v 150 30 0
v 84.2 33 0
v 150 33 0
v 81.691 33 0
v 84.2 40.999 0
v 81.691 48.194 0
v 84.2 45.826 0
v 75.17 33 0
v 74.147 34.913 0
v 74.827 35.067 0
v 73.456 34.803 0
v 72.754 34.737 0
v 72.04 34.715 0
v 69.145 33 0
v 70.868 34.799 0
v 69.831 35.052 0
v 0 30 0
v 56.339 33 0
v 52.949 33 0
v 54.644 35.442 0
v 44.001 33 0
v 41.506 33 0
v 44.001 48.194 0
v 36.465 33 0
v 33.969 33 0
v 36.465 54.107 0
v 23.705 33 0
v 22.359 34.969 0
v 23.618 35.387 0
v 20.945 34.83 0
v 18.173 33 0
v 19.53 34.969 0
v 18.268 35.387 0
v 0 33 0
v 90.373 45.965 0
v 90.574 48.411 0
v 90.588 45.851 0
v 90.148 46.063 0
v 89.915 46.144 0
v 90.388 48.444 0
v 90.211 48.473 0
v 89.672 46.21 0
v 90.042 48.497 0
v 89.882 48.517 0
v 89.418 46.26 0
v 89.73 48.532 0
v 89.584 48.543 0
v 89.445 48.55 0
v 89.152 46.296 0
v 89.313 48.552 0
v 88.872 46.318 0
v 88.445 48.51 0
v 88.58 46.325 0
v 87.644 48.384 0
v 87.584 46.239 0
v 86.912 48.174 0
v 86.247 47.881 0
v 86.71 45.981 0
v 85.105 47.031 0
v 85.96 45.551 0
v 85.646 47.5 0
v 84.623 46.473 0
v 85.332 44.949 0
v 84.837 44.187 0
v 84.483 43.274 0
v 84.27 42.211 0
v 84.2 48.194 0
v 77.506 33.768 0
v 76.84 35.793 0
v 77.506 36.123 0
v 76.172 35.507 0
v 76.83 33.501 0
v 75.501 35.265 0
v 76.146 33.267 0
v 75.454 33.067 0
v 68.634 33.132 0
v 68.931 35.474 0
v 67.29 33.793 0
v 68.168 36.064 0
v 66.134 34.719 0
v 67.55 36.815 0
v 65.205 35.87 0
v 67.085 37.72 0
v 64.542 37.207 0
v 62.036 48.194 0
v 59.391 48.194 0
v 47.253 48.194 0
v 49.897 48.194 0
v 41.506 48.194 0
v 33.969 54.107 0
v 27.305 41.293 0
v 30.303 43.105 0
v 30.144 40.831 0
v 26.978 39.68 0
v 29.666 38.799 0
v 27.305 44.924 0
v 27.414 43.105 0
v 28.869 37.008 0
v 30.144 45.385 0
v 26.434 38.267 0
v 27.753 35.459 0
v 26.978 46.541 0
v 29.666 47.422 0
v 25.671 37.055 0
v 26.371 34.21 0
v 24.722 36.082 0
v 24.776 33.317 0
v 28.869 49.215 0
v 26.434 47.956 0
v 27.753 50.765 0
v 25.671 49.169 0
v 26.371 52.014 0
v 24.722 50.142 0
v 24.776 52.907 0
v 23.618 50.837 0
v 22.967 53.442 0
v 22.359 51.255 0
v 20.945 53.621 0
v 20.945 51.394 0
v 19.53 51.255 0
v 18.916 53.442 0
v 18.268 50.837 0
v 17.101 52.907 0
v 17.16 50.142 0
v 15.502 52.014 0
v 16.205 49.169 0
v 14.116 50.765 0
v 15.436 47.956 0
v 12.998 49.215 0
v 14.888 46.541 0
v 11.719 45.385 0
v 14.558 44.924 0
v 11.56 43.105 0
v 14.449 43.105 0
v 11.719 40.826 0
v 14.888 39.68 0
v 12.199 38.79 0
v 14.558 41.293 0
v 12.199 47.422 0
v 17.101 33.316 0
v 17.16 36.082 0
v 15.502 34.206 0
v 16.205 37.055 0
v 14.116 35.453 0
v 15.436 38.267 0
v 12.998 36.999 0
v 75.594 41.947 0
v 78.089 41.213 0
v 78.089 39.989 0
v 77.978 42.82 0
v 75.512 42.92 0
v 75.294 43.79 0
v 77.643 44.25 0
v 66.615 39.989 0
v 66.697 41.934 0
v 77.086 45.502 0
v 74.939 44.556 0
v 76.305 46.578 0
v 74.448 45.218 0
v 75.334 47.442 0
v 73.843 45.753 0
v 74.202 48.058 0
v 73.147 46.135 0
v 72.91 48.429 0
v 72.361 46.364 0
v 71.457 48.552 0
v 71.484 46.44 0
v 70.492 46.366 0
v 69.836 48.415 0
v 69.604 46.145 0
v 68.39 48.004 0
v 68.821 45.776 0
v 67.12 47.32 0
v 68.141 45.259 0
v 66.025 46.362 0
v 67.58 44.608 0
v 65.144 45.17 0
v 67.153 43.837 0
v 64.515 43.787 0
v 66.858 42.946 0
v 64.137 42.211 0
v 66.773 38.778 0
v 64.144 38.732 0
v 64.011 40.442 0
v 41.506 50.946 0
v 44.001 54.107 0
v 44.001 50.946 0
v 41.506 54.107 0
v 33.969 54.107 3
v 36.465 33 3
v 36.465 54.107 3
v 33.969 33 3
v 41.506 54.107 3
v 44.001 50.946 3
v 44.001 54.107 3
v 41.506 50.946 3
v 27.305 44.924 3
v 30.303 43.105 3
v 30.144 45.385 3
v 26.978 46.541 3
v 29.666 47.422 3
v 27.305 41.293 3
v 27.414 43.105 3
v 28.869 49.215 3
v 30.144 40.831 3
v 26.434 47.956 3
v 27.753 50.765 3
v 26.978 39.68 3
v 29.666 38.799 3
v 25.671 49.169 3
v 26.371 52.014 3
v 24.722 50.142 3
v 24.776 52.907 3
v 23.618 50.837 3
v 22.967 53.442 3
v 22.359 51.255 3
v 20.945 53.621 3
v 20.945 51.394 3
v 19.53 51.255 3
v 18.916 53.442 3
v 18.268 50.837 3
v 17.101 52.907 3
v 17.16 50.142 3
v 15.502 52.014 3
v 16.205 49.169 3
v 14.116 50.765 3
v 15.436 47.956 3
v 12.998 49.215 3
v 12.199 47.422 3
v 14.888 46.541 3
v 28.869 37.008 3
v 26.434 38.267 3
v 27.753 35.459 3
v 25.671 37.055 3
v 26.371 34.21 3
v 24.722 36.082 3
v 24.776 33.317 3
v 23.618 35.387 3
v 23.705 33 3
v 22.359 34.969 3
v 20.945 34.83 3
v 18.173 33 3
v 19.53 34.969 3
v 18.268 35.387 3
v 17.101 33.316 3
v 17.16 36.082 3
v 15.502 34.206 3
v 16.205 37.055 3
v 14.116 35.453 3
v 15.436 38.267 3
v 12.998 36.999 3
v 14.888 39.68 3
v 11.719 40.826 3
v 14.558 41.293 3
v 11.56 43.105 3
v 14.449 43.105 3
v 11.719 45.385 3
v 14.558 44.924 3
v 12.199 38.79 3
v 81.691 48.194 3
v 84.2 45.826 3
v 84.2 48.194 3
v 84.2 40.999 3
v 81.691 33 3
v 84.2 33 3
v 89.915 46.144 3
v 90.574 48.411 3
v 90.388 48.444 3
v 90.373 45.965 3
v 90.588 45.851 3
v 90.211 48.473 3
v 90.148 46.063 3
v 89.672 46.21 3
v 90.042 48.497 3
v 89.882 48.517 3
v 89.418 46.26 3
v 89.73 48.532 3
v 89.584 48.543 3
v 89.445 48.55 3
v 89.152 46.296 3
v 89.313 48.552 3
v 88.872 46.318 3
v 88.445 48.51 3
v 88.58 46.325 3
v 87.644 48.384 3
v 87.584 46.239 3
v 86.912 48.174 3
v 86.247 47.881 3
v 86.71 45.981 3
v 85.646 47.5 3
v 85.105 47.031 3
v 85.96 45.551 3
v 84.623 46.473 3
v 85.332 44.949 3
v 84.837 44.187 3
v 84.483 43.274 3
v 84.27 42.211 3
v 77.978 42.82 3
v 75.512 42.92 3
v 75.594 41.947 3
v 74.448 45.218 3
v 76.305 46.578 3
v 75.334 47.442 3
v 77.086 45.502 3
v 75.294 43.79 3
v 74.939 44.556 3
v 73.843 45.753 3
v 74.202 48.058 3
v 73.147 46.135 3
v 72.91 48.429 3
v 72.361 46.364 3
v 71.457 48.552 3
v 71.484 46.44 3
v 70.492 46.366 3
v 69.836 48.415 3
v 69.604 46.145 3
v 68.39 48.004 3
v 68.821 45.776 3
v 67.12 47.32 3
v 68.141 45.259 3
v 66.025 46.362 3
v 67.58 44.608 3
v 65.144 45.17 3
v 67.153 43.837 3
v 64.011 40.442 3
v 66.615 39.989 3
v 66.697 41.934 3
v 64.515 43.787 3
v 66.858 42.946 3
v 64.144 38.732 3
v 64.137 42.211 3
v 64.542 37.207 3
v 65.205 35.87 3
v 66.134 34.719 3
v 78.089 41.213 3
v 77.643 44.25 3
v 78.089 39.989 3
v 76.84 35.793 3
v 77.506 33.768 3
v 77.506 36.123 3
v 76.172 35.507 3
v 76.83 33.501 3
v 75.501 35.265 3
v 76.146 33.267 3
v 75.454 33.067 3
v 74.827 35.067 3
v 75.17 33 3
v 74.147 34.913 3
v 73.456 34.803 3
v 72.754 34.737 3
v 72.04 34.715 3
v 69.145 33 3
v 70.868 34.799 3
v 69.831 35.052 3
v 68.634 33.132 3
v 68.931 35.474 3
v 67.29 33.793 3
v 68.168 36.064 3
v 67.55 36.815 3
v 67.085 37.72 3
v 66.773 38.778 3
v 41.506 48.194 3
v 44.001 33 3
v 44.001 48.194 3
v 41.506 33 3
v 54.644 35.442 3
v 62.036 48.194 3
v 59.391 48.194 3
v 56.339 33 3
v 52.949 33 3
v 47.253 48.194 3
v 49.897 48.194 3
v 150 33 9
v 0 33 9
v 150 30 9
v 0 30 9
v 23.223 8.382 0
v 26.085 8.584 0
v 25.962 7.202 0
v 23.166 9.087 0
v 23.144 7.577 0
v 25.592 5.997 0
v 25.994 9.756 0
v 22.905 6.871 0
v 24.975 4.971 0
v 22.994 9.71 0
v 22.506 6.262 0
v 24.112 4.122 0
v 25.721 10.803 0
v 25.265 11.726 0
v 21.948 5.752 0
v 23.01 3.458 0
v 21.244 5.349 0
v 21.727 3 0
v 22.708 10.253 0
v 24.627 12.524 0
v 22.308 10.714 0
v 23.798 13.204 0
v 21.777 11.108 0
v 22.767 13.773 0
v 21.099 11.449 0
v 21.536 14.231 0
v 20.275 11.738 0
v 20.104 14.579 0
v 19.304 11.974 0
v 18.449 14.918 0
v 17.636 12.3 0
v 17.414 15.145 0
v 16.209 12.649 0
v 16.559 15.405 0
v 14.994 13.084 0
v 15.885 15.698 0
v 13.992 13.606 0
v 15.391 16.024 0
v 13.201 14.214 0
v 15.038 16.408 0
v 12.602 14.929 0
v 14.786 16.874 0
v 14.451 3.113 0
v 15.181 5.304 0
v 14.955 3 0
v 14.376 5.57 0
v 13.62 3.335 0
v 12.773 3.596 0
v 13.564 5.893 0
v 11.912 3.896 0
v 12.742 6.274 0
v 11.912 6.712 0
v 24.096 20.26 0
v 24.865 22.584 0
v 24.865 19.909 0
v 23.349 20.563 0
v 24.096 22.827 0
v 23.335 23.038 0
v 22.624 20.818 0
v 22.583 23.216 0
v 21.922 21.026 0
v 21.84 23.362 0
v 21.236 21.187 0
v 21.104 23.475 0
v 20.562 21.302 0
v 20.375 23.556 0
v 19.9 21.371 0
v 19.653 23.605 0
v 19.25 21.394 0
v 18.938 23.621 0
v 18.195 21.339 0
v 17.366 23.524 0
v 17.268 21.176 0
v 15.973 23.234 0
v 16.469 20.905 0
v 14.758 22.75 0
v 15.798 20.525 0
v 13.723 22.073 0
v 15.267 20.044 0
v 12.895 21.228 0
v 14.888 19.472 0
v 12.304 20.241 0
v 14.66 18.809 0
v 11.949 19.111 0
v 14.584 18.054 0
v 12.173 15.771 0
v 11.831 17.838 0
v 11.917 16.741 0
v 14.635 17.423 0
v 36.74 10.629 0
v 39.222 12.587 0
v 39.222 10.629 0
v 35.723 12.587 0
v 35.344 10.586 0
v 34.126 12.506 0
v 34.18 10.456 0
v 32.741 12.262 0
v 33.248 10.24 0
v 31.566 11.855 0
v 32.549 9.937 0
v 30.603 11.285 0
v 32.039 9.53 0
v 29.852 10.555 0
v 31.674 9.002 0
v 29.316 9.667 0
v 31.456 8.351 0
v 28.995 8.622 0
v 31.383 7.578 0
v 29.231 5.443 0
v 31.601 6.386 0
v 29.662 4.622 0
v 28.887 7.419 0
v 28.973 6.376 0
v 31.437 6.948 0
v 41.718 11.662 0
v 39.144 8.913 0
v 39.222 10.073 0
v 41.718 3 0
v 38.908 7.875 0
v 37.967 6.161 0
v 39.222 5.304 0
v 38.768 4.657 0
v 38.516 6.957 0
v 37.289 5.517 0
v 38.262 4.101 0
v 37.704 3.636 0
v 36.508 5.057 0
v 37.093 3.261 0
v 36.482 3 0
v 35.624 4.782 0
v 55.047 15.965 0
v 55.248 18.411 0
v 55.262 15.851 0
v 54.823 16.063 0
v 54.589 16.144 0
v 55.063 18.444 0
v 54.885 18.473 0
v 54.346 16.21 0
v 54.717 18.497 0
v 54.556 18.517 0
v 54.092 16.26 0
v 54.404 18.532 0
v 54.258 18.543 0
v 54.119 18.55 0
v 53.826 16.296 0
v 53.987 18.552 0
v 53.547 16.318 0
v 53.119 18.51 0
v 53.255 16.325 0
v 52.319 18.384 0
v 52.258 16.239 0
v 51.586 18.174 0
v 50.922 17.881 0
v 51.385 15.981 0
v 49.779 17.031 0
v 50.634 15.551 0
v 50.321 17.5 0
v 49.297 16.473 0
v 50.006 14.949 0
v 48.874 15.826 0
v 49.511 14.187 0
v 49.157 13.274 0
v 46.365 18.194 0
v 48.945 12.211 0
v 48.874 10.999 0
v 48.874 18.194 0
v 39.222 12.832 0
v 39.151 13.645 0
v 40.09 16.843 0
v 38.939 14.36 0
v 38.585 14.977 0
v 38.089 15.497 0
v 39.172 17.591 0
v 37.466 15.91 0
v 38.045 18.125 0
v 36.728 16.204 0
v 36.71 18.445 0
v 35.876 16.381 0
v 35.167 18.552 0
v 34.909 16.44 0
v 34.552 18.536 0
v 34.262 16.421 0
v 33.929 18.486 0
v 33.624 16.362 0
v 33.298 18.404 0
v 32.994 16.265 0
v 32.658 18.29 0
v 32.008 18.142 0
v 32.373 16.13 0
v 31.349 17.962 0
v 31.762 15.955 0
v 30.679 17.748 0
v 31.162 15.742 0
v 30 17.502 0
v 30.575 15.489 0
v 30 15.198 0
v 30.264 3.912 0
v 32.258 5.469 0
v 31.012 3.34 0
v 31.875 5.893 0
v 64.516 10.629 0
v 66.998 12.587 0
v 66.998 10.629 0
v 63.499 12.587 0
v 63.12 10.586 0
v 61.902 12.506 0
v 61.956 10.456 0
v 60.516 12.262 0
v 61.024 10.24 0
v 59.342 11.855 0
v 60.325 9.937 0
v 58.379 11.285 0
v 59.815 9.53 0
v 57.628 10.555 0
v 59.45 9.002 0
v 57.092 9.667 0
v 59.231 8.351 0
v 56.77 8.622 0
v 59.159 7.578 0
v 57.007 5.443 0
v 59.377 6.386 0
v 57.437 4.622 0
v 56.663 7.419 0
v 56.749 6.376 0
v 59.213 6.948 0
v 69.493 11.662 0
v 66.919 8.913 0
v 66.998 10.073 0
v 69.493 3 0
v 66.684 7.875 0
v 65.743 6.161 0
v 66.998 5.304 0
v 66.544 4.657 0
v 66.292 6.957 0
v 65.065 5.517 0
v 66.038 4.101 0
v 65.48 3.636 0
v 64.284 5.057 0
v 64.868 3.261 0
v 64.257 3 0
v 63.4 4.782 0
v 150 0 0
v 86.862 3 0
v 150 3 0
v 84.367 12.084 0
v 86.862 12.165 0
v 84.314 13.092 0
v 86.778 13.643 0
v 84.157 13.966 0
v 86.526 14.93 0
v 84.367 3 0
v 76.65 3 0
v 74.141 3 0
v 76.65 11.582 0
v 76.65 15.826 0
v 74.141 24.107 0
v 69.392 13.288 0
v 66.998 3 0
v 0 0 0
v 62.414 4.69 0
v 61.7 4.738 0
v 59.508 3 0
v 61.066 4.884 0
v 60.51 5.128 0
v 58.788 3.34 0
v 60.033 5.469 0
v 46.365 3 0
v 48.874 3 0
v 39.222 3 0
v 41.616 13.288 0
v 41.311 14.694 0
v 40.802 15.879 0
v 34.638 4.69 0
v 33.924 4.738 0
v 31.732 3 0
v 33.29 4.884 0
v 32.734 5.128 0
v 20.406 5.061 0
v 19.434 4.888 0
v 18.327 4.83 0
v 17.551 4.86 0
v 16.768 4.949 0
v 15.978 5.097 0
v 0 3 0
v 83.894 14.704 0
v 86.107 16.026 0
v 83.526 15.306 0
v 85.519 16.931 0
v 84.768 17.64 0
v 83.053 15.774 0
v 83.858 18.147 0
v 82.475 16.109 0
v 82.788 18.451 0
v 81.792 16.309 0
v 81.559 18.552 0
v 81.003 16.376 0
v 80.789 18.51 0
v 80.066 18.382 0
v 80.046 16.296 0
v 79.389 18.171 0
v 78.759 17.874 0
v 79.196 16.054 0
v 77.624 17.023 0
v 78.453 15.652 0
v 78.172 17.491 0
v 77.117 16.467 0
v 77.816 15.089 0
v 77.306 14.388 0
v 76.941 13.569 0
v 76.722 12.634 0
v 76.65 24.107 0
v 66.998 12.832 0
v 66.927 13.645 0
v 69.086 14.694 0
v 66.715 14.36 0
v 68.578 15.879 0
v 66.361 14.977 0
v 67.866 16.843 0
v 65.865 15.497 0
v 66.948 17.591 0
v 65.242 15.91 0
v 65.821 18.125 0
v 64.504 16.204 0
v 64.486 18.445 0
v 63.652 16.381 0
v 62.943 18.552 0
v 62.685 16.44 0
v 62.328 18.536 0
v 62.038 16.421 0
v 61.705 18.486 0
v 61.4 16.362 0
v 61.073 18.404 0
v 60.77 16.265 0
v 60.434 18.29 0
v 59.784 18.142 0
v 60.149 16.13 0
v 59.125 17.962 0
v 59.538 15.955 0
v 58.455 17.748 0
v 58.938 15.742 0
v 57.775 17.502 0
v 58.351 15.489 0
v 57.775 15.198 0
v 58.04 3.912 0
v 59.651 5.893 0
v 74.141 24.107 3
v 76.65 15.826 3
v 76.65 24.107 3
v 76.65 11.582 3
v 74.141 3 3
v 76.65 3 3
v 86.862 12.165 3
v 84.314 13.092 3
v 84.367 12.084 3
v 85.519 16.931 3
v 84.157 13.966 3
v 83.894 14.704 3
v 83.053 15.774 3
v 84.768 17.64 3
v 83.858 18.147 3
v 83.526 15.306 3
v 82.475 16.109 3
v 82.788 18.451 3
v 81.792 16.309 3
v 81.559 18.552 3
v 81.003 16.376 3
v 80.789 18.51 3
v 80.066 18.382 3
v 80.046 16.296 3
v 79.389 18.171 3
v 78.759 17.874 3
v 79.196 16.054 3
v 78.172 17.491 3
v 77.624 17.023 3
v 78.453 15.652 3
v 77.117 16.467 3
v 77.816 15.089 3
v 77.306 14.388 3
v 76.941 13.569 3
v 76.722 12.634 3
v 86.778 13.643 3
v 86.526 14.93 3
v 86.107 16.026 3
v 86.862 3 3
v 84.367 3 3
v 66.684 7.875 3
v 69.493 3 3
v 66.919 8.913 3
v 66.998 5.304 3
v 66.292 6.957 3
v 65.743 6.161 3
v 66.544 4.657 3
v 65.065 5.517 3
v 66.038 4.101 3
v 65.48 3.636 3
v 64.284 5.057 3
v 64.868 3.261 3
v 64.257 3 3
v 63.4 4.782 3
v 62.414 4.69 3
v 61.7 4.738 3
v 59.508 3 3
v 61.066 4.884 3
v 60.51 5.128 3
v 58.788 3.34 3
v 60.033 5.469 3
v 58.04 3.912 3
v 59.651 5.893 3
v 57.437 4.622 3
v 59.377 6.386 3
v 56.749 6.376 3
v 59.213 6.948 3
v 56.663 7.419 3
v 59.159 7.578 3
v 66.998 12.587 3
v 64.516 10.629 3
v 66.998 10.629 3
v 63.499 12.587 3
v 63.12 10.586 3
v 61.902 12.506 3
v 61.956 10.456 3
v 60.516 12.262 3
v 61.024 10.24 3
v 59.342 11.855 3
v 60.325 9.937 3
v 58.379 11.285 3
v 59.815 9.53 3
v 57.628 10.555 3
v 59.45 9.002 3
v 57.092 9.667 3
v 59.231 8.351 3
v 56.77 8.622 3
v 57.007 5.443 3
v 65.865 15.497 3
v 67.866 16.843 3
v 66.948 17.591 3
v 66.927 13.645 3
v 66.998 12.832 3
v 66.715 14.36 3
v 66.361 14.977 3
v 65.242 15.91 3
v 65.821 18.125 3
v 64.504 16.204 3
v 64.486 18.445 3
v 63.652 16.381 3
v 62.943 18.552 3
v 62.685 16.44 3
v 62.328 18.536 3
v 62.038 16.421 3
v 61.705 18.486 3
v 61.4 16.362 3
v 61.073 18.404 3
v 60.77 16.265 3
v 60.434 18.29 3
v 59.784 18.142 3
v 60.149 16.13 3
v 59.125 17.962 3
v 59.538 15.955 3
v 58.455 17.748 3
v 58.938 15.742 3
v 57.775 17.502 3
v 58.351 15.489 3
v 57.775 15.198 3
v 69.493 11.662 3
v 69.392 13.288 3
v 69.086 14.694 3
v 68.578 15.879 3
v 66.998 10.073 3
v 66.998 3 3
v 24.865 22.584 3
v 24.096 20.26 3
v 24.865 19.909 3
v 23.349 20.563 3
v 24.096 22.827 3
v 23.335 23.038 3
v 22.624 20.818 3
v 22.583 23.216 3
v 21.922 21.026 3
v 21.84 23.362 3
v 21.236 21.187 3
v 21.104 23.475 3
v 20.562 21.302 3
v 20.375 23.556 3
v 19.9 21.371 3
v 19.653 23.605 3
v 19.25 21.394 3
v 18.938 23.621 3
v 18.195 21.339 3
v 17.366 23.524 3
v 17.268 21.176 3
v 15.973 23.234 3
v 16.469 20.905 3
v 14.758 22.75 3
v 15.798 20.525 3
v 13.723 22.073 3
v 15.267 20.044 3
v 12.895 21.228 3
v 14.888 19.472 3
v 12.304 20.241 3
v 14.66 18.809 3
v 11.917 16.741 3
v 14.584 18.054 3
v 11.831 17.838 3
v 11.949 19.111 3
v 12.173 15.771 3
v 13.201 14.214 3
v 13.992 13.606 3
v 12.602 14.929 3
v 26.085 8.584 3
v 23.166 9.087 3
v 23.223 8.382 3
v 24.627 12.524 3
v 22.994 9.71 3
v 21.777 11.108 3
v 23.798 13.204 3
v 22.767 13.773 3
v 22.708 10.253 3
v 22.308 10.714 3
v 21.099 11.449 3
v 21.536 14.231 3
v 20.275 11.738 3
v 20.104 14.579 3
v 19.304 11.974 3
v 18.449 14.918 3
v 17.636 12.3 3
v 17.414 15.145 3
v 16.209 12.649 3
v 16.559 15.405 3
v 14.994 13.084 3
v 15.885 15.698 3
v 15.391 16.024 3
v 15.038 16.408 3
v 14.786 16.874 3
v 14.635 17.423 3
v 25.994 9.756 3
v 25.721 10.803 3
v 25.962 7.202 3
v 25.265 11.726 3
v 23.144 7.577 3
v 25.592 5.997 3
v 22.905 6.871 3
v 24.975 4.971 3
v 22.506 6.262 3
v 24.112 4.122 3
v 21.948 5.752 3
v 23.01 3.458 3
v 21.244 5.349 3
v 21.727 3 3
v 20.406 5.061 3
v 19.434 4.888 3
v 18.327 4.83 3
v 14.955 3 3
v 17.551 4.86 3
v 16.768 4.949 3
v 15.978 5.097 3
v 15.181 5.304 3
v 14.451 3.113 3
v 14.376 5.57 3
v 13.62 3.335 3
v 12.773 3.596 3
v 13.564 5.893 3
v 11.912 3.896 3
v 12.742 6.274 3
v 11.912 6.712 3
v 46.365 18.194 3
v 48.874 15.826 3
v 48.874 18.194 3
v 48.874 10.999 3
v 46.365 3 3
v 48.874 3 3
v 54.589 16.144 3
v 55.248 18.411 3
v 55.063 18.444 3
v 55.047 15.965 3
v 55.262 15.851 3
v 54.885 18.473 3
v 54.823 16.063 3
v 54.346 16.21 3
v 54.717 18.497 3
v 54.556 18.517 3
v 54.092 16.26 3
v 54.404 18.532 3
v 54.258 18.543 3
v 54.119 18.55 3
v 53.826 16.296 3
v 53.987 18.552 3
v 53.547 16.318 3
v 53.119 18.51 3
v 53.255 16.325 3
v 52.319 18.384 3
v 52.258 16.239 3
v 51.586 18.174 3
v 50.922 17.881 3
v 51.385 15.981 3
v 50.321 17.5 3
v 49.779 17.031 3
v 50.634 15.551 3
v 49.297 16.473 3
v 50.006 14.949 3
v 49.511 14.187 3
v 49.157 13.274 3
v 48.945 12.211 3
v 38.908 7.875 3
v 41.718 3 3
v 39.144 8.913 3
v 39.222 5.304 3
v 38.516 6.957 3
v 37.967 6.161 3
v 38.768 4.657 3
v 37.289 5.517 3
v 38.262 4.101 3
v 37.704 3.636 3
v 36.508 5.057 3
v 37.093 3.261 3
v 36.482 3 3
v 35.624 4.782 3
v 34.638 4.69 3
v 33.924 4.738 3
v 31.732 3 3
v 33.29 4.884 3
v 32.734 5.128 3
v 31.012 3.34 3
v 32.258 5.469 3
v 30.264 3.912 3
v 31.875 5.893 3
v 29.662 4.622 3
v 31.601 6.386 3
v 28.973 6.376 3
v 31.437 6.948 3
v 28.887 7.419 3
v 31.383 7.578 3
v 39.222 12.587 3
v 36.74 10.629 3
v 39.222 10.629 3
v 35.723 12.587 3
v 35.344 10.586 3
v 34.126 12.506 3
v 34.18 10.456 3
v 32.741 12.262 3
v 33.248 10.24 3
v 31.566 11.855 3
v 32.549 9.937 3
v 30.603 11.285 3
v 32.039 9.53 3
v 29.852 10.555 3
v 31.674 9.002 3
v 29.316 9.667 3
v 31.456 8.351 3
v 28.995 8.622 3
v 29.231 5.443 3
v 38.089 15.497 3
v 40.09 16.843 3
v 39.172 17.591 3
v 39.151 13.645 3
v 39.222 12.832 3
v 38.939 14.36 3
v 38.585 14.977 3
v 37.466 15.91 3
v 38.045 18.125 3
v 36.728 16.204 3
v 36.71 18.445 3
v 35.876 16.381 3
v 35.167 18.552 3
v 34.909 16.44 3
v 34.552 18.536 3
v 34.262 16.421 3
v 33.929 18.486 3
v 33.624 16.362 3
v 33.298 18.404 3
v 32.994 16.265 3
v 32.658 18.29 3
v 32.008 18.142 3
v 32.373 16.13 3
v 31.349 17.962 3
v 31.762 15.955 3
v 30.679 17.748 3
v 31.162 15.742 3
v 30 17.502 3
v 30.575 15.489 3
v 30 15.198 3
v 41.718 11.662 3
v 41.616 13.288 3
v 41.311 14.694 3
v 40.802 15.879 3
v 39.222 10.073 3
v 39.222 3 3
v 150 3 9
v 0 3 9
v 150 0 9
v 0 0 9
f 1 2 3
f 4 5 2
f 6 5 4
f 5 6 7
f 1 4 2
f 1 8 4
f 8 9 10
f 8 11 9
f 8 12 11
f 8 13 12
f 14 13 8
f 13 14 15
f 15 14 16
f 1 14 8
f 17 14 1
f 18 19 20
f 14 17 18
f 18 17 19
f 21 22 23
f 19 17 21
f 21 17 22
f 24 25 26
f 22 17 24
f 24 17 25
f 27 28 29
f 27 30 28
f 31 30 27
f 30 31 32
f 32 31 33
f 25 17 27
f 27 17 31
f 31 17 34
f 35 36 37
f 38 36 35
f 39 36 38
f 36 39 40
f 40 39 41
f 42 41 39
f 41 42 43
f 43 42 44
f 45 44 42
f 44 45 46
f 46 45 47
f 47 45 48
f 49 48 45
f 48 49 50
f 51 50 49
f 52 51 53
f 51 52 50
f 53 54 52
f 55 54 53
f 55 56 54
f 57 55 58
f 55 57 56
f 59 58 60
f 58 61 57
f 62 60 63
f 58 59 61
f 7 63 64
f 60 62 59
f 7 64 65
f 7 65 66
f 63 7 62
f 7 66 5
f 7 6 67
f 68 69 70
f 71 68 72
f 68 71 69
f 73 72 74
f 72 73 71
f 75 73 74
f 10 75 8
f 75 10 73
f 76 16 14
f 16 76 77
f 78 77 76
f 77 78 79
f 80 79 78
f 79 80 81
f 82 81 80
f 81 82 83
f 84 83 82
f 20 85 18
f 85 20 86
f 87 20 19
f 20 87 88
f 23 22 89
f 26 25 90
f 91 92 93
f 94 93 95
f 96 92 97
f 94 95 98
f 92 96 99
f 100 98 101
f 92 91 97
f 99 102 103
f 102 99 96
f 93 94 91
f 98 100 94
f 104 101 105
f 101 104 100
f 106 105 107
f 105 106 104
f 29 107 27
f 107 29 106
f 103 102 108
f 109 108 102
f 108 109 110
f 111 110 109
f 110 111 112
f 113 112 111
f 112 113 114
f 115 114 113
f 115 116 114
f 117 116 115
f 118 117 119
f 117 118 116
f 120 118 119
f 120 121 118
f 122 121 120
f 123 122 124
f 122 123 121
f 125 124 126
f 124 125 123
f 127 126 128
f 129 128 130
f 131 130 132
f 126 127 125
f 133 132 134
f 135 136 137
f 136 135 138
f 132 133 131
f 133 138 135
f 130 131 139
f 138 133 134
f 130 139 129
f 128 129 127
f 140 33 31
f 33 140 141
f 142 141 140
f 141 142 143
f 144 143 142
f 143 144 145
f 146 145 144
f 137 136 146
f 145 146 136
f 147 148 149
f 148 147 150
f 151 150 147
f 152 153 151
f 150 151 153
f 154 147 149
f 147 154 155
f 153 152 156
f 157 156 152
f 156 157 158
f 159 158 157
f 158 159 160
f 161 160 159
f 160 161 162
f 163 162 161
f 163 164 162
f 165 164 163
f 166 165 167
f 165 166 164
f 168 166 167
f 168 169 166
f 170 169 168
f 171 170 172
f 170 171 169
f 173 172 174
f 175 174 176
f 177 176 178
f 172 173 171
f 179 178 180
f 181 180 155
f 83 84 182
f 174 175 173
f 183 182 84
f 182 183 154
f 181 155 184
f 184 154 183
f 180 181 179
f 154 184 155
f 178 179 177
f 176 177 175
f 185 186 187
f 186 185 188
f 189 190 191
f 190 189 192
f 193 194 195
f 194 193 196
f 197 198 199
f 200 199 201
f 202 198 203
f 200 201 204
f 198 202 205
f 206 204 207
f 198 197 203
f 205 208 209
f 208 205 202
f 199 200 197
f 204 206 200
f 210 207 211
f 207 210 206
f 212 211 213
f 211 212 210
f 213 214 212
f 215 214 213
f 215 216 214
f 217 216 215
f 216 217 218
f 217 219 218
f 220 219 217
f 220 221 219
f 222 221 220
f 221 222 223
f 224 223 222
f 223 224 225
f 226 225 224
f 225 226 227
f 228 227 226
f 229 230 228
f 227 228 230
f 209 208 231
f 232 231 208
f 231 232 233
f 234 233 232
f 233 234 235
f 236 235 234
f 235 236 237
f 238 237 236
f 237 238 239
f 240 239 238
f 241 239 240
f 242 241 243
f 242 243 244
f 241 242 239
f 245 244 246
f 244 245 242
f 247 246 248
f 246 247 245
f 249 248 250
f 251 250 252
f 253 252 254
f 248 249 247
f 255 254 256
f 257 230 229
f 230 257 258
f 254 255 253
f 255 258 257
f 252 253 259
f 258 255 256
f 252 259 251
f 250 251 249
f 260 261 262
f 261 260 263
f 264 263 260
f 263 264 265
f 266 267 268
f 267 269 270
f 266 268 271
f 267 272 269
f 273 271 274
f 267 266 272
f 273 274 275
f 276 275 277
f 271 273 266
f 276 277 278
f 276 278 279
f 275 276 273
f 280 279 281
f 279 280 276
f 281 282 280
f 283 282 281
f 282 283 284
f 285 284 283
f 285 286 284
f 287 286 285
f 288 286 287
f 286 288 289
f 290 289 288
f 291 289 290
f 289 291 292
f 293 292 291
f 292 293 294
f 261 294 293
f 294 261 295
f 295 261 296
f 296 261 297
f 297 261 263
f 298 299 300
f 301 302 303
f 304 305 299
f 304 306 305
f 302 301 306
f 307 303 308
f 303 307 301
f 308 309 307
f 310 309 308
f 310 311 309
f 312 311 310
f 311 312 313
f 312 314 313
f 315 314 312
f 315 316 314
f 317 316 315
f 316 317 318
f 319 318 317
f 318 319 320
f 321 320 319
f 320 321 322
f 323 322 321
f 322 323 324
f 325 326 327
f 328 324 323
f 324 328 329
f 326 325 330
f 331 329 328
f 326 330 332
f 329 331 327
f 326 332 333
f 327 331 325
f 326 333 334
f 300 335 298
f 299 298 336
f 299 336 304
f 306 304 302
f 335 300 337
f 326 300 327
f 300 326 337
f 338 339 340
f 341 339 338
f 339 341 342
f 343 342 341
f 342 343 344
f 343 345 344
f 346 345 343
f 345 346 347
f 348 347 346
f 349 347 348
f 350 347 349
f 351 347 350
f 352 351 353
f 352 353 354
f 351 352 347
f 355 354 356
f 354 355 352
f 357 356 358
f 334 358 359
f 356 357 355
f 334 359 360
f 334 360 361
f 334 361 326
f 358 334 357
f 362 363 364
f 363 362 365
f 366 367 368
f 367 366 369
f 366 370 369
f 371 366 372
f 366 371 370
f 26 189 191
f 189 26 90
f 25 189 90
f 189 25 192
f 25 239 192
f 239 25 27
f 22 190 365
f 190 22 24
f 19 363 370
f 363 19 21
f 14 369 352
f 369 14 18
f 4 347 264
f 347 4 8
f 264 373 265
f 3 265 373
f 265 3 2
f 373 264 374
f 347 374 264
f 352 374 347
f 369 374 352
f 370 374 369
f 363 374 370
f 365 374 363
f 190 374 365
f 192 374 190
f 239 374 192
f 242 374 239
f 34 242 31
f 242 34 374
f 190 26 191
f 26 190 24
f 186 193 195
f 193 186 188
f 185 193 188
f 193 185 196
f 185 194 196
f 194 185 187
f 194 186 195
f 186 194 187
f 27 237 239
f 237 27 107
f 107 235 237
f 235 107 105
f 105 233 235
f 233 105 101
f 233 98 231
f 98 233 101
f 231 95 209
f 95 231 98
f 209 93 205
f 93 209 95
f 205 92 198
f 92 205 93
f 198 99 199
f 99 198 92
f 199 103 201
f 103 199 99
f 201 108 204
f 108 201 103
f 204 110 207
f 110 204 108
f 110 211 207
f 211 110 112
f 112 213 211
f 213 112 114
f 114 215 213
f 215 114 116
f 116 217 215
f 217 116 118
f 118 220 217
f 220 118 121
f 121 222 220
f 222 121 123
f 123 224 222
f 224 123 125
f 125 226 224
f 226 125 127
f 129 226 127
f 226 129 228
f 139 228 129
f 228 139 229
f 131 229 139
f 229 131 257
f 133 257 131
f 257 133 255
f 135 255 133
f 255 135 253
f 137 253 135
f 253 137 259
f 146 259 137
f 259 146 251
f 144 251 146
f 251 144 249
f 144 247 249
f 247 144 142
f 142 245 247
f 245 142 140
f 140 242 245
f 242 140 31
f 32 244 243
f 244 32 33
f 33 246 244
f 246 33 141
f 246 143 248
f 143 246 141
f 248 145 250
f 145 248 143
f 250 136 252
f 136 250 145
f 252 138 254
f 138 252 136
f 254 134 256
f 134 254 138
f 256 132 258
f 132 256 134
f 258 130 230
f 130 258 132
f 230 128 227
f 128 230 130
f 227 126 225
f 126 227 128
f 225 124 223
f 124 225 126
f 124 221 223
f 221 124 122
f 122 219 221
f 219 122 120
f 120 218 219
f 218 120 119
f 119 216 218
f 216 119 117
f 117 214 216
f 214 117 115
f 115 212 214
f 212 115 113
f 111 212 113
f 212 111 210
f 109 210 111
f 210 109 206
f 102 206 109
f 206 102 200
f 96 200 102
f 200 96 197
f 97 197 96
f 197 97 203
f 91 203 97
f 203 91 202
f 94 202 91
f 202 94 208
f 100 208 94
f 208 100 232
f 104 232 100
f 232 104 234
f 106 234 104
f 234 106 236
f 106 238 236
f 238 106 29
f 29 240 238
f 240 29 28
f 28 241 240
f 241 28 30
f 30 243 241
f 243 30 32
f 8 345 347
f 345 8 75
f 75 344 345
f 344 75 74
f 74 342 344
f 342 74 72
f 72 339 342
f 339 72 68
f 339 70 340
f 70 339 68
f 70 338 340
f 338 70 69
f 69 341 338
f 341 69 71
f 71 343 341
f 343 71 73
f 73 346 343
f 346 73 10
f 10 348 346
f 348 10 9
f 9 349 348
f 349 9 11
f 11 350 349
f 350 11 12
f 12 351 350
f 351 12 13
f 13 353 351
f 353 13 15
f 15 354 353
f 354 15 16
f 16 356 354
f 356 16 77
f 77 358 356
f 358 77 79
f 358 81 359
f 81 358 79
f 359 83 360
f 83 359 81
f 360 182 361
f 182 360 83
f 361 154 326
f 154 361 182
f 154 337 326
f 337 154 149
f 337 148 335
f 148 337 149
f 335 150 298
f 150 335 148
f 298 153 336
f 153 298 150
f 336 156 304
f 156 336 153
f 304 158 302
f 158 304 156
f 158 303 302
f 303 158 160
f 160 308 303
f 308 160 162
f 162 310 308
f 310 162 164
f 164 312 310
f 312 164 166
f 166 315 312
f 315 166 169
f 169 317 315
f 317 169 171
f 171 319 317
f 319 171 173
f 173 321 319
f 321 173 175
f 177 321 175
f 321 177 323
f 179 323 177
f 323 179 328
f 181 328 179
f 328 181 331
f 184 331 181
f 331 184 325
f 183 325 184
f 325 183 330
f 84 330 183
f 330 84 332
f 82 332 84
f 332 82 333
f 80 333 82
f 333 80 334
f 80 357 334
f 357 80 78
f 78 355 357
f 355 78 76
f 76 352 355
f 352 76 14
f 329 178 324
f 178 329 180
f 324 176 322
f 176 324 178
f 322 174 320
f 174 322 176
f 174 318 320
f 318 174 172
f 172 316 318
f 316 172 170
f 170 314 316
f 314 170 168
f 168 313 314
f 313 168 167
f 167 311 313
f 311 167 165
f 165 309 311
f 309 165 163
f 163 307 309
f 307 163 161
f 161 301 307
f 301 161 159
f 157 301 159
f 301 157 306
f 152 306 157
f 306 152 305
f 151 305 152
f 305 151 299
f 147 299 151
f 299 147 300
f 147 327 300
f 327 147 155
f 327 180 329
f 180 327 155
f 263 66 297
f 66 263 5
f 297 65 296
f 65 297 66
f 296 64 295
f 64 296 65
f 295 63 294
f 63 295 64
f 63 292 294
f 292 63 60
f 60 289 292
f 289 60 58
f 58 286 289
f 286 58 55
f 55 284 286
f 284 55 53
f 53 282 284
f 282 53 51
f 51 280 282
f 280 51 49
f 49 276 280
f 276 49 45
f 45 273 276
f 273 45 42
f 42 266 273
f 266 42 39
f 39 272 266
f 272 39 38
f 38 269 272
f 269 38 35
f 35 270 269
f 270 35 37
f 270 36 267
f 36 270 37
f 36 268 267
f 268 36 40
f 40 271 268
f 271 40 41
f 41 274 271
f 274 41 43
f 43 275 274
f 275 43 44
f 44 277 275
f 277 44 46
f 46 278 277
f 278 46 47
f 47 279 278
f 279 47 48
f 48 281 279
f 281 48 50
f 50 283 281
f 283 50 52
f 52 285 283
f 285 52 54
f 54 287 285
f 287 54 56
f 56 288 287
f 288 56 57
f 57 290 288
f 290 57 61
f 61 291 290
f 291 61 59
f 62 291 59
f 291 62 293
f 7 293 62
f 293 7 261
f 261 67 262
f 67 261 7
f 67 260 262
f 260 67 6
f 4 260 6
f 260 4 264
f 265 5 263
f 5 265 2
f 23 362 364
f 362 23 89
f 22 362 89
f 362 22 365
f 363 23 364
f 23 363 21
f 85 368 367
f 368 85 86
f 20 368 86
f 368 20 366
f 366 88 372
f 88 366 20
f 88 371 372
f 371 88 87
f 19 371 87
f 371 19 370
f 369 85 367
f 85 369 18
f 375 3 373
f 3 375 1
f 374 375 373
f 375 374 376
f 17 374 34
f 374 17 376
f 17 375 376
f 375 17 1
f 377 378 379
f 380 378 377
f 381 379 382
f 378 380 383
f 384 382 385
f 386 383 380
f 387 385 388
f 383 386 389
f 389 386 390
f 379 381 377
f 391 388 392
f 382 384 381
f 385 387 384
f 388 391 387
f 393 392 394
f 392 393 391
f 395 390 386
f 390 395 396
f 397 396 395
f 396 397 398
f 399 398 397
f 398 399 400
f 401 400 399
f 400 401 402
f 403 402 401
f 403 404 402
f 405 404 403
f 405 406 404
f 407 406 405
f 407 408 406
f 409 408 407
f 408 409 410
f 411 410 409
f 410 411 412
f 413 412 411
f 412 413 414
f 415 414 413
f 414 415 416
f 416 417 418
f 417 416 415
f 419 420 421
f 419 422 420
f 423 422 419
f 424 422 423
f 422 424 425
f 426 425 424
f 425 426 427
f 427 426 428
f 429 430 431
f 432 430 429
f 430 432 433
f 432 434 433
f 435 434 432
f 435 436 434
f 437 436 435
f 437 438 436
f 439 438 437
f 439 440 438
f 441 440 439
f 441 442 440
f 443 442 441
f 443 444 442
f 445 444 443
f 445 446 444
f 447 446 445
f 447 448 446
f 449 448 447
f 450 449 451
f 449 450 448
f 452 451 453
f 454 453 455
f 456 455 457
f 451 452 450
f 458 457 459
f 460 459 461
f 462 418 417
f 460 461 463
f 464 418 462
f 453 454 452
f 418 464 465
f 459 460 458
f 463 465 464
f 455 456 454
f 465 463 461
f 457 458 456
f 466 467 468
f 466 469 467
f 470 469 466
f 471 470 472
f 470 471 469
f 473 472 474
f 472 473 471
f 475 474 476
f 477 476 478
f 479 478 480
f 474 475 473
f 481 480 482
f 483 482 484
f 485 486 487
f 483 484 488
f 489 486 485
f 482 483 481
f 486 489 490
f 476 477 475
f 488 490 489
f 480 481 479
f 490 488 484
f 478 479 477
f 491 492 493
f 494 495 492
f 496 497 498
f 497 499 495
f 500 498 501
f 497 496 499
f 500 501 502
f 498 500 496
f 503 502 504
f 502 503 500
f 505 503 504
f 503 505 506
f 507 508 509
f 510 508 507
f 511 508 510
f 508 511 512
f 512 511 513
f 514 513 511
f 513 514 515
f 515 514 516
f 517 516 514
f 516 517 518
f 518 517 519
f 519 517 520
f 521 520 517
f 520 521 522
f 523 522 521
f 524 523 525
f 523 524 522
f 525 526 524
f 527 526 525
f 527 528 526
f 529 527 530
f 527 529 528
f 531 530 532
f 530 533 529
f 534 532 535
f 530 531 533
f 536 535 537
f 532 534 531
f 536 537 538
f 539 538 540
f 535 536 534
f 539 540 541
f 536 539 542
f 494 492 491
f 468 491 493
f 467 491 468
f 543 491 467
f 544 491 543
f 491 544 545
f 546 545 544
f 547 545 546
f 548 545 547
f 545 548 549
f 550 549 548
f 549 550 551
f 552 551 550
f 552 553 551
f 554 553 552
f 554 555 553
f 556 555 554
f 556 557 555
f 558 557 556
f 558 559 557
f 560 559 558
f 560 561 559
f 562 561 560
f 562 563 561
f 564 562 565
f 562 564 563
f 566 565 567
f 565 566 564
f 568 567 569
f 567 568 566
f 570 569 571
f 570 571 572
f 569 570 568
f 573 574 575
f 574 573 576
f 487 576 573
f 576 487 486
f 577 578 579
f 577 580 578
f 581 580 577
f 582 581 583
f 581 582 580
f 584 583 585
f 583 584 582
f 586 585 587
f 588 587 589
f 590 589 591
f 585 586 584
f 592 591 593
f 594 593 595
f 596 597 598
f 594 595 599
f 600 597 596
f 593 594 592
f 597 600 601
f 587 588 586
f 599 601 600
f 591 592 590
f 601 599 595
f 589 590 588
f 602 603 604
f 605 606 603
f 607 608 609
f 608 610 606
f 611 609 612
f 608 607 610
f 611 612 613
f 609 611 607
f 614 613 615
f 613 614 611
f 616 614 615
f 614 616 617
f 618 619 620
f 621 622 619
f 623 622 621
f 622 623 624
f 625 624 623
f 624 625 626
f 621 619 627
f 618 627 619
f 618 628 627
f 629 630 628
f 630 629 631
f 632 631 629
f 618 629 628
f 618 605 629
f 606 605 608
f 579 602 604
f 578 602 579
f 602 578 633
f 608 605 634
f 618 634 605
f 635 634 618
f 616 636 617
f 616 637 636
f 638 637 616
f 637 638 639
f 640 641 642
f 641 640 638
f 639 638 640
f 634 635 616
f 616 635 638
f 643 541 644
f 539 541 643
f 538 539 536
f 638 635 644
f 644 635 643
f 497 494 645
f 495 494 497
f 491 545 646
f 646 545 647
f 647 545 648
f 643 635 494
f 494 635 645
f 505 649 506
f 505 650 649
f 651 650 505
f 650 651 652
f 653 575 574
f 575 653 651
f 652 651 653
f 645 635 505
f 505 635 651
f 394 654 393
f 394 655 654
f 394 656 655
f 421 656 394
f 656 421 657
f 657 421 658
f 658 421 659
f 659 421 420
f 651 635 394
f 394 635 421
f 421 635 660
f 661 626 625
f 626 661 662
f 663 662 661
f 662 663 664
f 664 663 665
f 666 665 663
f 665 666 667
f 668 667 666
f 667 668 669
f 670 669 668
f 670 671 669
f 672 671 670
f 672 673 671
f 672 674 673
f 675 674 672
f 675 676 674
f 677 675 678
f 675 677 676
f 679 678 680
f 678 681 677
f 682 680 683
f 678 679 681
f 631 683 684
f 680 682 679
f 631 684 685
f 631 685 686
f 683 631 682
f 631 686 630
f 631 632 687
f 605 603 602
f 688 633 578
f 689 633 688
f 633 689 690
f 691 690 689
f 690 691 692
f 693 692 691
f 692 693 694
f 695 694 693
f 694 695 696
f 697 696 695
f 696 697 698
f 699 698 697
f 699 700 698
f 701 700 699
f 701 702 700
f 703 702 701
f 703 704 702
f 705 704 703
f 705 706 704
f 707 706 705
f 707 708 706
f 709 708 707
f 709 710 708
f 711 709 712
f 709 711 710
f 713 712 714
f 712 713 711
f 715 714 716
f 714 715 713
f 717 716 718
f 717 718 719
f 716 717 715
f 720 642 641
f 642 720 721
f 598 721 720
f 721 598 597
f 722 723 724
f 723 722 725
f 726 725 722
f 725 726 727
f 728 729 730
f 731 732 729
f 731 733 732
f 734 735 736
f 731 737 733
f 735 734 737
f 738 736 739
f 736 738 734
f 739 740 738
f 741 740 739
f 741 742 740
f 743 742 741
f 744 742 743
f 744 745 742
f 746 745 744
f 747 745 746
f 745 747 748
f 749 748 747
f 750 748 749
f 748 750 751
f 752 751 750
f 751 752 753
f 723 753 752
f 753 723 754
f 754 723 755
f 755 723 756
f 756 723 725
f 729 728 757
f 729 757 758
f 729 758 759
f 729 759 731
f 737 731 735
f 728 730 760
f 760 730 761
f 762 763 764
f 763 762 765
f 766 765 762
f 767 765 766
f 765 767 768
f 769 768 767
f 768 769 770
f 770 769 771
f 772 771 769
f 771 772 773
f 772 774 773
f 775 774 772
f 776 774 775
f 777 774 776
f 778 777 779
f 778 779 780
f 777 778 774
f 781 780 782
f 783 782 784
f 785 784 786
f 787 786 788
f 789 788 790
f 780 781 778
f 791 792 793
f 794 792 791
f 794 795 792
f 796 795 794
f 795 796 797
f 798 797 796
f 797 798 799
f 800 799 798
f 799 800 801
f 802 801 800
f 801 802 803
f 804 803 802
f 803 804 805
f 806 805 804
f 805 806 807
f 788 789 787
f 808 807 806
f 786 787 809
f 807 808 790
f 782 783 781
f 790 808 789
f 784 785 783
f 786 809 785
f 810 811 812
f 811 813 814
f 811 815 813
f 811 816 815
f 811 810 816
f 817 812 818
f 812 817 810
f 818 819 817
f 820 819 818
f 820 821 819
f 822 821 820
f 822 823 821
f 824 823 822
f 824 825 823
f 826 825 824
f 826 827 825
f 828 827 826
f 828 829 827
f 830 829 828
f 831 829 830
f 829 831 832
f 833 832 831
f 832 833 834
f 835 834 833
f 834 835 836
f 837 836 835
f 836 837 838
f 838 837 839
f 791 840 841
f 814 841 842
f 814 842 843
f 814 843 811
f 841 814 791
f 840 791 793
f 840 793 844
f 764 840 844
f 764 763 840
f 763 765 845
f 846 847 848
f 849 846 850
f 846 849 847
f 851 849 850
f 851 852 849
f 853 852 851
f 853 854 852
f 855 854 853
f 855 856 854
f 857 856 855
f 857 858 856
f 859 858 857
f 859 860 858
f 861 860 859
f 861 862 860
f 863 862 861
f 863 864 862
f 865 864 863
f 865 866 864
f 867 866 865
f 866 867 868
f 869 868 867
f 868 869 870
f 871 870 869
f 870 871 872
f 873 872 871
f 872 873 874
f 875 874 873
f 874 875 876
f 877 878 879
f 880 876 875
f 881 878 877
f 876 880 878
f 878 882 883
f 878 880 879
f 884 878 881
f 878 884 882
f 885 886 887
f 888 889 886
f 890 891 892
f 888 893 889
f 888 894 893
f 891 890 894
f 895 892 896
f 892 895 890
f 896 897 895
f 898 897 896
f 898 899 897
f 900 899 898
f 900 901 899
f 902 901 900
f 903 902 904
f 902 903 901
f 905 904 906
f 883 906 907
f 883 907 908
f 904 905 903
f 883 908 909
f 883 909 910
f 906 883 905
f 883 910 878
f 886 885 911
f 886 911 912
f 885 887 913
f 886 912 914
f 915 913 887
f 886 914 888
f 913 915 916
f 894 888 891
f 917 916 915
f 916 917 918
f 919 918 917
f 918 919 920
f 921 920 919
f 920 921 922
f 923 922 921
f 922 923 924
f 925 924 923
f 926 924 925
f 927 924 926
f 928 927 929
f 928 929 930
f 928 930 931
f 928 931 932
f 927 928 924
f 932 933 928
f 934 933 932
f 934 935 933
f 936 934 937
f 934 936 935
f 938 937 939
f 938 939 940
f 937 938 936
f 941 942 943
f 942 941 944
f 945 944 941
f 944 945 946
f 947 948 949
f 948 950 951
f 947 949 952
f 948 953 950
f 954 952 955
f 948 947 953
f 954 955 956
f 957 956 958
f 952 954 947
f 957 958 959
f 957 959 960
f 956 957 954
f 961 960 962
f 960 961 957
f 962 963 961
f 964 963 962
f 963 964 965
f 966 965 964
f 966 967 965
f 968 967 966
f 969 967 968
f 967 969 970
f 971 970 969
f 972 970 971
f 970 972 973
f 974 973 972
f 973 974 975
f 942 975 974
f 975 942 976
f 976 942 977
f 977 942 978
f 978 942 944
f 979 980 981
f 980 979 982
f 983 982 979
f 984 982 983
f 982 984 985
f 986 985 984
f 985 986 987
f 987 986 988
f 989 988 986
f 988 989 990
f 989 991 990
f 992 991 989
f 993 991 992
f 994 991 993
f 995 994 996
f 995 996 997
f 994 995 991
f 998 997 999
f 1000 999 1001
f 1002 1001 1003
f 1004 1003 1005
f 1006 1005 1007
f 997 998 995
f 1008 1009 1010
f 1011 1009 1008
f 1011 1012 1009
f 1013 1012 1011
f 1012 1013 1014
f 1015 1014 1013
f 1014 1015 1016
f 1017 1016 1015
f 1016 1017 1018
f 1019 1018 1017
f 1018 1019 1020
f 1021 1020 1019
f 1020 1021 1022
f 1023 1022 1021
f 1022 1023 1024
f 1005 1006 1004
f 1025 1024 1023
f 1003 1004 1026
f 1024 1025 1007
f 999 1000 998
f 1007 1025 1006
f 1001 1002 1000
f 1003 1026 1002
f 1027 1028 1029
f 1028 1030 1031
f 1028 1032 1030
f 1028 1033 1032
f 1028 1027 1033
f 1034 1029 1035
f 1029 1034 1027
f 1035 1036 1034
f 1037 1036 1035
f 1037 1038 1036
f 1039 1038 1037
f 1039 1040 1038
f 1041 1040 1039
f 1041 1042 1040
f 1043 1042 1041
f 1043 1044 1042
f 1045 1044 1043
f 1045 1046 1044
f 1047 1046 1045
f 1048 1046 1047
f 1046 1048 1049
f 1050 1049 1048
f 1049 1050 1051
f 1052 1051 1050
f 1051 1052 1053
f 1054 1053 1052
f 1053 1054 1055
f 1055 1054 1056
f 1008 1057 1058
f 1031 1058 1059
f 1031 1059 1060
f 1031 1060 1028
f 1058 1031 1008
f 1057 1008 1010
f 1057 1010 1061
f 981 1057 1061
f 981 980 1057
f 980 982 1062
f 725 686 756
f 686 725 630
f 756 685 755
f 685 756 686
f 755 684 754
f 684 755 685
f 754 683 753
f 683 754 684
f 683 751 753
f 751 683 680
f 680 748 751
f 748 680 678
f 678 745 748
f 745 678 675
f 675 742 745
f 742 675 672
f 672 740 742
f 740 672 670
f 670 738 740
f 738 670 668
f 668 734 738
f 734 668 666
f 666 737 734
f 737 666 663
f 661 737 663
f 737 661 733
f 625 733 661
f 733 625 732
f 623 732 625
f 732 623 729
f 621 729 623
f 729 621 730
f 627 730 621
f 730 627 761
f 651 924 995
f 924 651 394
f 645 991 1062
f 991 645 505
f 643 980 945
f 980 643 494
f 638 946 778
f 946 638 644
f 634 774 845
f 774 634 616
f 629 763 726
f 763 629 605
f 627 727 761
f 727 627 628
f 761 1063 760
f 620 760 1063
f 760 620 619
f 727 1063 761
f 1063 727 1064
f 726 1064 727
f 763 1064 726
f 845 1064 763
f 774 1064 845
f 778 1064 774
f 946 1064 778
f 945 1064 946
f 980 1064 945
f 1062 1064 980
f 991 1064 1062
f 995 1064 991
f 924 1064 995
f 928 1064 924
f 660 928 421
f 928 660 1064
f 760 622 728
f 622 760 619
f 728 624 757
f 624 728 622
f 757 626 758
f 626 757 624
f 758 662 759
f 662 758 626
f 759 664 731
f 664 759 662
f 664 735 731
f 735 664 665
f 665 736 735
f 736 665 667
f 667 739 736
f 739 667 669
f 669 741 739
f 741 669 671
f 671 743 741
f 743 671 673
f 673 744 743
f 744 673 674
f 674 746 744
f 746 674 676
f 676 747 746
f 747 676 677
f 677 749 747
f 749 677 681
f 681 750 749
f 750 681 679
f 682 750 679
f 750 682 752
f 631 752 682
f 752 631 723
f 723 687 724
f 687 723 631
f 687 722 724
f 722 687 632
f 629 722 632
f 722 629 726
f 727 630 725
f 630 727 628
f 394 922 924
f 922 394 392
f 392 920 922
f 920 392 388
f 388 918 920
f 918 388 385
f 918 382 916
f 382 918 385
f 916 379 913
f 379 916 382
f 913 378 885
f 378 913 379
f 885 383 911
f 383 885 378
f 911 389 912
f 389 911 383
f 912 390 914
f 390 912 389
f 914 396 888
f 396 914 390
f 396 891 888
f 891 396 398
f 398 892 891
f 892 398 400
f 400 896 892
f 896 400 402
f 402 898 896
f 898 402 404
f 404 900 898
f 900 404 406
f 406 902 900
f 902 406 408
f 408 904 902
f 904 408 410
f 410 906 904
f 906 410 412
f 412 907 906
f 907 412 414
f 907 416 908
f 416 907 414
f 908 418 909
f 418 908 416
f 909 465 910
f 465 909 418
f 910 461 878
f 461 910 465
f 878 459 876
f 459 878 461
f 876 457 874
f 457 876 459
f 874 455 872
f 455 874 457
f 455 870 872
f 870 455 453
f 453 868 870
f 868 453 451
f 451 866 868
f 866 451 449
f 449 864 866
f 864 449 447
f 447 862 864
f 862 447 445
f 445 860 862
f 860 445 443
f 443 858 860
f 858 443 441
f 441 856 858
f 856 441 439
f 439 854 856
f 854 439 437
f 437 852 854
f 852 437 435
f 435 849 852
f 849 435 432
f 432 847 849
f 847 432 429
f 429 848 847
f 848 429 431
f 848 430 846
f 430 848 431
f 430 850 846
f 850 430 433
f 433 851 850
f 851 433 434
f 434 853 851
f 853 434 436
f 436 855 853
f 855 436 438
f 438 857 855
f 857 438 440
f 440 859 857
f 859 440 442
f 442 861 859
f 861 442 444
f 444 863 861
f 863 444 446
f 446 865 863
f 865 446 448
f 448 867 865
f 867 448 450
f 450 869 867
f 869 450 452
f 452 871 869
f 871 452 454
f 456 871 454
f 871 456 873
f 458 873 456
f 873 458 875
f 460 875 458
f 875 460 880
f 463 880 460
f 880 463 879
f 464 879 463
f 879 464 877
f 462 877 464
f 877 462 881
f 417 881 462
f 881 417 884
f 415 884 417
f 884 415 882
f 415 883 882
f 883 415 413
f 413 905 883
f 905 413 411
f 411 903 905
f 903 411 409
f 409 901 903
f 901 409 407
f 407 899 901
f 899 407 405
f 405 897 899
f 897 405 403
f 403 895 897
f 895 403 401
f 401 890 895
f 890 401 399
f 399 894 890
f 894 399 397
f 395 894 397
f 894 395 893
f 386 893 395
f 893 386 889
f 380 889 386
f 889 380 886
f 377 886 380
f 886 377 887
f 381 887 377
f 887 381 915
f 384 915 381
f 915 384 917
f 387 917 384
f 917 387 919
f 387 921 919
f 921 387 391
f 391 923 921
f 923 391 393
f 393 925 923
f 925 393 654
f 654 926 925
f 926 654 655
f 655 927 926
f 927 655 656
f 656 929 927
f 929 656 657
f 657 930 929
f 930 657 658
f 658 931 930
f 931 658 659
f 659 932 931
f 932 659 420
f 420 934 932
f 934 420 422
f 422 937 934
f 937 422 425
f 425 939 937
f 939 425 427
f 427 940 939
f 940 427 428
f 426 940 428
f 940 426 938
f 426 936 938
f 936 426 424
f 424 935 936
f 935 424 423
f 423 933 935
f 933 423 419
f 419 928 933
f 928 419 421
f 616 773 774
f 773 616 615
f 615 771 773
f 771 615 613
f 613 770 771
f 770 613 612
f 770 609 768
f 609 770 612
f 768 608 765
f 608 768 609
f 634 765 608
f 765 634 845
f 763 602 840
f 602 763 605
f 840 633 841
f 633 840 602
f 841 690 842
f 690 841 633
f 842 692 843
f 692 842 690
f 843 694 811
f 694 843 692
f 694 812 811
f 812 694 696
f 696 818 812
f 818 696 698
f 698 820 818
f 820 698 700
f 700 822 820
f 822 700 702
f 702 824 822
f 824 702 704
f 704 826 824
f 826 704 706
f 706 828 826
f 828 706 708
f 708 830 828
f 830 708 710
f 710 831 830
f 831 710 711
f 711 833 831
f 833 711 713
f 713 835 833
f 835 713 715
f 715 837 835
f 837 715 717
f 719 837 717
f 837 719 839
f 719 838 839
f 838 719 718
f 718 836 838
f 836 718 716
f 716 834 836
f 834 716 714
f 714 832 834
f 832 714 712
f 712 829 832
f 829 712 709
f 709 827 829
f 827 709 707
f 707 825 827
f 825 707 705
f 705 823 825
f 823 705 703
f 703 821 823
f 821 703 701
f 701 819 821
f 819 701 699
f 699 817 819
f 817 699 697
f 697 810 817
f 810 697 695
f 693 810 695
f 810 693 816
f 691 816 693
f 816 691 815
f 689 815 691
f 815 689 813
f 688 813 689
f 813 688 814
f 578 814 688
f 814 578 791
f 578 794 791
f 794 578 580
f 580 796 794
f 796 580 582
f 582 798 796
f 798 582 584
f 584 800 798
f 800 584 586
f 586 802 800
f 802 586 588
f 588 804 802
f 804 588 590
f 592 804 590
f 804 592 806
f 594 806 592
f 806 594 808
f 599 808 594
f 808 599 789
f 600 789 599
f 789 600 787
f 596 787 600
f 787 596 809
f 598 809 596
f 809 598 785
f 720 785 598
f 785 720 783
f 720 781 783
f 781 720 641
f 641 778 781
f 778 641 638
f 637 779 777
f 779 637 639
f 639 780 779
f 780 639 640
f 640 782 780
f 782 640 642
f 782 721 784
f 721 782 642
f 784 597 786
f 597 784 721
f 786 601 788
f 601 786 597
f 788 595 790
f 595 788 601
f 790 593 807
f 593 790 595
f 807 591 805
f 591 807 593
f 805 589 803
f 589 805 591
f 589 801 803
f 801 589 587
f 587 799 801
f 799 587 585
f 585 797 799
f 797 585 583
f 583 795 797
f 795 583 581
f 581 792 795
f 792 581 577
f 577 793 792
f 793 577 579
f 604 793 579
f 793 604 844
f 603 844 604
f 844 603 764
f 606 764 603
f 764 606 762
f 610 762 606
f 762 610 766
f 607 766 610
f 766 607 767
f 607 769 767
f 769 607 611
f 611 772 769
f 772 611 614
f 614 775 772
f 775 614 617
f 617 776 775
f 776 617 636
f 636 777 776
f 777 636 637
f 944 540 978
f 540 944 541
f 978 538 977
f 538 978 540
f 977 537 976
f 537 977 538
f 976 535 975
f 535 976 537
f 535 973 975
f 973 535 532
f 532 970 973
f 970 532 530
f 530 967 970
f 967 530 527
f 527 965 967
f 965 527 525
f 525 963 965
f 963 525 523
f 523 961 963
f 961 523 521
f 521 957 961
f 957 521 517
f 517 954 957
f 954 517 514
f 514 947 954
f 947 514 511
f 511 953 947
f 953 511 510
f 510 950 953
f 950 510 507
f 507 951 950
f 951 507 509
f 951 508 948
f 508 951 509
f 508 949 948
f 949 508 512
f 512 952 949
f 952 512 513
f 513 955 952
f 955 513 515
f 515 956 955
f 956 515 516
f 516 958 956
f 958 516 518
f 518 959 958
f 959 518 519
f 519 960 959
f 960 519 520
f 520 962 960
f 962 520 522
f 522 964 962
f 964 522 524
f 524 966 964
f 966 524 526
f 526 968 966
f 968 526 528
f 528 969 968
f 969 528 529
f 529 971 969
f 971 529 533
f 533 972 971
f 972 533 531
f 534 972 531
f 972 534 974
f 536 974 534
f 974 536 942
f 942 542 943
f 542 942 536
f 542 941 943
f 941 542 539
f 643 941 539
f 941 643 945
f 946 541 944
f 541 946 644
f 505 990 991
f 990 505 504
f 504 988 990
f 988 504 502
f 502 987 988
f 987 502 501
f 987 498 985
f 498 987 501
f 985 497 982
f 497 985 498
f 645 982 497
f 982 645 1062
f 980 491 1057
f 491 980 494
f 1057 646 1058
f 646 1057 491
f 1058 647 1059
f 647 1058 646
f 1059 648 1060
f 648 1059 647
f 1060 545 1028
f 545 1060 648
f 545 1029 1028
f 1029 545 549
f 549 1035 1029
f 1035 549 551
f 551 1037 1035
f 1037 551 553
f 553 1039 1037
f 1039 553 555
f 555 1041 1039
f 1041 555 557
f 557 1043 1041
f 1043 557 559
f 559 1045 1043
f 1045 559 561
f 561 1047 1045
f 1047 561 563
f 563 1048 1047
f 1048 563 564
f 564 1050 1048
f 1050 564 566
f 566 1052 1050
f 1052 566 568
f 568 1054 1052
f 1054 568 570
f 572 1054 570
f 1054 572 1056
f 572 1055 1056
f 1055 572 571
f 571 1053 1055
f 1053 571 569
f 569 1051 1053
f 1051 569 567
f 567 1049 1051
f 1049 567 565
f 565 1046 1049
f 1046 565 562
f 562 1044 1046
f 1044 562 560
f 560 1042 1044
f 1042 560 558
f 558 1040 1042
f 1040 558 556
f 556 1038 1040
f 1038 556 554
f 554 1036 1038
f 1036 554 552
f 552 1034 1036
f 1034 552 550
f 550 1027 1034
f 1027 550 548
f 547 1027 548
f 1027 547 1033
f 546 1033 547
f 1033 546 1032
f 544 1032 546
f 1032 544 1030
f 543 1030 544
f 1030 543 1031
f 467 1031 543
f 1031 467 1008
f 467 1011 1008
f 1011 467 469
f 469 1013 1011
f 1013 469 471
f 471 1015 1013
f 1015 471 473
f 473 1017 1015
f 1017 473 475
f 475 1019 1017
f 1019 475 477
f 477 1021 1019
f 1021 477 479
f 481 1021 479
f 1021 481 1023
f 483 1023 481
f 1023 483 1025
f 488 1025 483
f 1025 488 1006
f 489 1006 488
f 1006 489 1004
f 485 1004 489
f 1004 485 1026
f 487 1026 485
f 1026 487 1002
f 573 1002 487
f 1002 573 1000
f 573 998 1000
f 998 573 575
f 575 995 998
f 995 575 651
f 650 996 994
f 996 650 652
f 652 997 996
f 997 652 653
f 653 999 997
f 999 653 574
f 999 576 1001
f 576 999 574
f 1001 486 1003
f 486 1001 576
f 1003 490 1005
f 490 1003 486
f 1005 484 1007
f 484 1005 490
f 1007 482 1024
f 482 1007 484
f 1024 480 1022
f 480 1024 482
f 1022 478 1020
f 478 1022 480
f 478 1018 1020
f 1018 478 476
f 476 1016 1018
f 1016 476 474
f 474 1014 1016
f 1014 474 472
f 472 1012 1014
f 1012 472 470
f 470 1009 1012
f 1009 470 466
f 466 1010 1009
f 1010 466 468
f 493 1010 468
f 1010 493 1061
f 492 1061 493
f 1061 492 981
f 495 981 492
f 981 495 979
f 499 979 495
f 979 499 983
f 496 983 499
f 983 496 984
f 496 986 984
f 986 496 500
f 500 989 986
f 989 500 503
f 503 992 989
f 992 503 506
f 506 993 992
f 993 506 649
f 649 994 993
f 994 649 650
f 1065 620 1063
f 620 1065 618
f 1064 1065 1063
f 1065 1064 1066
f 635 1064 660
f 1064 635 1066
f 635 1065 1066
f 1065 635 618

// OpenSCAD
translate([0, 30, 0])
union(){
  translate([10, 3, 0])
  linear_extrude(height=3)
    text("Oliver", 20, "Cascadia Code Semibold");
  cube([150, 3, 9]);
}

translate([10, 3, 0])
linear_extrude(height=3)
    text("Sarah", 20, "Cascadia Code Semibold");
cube([150, 3, 9]);
